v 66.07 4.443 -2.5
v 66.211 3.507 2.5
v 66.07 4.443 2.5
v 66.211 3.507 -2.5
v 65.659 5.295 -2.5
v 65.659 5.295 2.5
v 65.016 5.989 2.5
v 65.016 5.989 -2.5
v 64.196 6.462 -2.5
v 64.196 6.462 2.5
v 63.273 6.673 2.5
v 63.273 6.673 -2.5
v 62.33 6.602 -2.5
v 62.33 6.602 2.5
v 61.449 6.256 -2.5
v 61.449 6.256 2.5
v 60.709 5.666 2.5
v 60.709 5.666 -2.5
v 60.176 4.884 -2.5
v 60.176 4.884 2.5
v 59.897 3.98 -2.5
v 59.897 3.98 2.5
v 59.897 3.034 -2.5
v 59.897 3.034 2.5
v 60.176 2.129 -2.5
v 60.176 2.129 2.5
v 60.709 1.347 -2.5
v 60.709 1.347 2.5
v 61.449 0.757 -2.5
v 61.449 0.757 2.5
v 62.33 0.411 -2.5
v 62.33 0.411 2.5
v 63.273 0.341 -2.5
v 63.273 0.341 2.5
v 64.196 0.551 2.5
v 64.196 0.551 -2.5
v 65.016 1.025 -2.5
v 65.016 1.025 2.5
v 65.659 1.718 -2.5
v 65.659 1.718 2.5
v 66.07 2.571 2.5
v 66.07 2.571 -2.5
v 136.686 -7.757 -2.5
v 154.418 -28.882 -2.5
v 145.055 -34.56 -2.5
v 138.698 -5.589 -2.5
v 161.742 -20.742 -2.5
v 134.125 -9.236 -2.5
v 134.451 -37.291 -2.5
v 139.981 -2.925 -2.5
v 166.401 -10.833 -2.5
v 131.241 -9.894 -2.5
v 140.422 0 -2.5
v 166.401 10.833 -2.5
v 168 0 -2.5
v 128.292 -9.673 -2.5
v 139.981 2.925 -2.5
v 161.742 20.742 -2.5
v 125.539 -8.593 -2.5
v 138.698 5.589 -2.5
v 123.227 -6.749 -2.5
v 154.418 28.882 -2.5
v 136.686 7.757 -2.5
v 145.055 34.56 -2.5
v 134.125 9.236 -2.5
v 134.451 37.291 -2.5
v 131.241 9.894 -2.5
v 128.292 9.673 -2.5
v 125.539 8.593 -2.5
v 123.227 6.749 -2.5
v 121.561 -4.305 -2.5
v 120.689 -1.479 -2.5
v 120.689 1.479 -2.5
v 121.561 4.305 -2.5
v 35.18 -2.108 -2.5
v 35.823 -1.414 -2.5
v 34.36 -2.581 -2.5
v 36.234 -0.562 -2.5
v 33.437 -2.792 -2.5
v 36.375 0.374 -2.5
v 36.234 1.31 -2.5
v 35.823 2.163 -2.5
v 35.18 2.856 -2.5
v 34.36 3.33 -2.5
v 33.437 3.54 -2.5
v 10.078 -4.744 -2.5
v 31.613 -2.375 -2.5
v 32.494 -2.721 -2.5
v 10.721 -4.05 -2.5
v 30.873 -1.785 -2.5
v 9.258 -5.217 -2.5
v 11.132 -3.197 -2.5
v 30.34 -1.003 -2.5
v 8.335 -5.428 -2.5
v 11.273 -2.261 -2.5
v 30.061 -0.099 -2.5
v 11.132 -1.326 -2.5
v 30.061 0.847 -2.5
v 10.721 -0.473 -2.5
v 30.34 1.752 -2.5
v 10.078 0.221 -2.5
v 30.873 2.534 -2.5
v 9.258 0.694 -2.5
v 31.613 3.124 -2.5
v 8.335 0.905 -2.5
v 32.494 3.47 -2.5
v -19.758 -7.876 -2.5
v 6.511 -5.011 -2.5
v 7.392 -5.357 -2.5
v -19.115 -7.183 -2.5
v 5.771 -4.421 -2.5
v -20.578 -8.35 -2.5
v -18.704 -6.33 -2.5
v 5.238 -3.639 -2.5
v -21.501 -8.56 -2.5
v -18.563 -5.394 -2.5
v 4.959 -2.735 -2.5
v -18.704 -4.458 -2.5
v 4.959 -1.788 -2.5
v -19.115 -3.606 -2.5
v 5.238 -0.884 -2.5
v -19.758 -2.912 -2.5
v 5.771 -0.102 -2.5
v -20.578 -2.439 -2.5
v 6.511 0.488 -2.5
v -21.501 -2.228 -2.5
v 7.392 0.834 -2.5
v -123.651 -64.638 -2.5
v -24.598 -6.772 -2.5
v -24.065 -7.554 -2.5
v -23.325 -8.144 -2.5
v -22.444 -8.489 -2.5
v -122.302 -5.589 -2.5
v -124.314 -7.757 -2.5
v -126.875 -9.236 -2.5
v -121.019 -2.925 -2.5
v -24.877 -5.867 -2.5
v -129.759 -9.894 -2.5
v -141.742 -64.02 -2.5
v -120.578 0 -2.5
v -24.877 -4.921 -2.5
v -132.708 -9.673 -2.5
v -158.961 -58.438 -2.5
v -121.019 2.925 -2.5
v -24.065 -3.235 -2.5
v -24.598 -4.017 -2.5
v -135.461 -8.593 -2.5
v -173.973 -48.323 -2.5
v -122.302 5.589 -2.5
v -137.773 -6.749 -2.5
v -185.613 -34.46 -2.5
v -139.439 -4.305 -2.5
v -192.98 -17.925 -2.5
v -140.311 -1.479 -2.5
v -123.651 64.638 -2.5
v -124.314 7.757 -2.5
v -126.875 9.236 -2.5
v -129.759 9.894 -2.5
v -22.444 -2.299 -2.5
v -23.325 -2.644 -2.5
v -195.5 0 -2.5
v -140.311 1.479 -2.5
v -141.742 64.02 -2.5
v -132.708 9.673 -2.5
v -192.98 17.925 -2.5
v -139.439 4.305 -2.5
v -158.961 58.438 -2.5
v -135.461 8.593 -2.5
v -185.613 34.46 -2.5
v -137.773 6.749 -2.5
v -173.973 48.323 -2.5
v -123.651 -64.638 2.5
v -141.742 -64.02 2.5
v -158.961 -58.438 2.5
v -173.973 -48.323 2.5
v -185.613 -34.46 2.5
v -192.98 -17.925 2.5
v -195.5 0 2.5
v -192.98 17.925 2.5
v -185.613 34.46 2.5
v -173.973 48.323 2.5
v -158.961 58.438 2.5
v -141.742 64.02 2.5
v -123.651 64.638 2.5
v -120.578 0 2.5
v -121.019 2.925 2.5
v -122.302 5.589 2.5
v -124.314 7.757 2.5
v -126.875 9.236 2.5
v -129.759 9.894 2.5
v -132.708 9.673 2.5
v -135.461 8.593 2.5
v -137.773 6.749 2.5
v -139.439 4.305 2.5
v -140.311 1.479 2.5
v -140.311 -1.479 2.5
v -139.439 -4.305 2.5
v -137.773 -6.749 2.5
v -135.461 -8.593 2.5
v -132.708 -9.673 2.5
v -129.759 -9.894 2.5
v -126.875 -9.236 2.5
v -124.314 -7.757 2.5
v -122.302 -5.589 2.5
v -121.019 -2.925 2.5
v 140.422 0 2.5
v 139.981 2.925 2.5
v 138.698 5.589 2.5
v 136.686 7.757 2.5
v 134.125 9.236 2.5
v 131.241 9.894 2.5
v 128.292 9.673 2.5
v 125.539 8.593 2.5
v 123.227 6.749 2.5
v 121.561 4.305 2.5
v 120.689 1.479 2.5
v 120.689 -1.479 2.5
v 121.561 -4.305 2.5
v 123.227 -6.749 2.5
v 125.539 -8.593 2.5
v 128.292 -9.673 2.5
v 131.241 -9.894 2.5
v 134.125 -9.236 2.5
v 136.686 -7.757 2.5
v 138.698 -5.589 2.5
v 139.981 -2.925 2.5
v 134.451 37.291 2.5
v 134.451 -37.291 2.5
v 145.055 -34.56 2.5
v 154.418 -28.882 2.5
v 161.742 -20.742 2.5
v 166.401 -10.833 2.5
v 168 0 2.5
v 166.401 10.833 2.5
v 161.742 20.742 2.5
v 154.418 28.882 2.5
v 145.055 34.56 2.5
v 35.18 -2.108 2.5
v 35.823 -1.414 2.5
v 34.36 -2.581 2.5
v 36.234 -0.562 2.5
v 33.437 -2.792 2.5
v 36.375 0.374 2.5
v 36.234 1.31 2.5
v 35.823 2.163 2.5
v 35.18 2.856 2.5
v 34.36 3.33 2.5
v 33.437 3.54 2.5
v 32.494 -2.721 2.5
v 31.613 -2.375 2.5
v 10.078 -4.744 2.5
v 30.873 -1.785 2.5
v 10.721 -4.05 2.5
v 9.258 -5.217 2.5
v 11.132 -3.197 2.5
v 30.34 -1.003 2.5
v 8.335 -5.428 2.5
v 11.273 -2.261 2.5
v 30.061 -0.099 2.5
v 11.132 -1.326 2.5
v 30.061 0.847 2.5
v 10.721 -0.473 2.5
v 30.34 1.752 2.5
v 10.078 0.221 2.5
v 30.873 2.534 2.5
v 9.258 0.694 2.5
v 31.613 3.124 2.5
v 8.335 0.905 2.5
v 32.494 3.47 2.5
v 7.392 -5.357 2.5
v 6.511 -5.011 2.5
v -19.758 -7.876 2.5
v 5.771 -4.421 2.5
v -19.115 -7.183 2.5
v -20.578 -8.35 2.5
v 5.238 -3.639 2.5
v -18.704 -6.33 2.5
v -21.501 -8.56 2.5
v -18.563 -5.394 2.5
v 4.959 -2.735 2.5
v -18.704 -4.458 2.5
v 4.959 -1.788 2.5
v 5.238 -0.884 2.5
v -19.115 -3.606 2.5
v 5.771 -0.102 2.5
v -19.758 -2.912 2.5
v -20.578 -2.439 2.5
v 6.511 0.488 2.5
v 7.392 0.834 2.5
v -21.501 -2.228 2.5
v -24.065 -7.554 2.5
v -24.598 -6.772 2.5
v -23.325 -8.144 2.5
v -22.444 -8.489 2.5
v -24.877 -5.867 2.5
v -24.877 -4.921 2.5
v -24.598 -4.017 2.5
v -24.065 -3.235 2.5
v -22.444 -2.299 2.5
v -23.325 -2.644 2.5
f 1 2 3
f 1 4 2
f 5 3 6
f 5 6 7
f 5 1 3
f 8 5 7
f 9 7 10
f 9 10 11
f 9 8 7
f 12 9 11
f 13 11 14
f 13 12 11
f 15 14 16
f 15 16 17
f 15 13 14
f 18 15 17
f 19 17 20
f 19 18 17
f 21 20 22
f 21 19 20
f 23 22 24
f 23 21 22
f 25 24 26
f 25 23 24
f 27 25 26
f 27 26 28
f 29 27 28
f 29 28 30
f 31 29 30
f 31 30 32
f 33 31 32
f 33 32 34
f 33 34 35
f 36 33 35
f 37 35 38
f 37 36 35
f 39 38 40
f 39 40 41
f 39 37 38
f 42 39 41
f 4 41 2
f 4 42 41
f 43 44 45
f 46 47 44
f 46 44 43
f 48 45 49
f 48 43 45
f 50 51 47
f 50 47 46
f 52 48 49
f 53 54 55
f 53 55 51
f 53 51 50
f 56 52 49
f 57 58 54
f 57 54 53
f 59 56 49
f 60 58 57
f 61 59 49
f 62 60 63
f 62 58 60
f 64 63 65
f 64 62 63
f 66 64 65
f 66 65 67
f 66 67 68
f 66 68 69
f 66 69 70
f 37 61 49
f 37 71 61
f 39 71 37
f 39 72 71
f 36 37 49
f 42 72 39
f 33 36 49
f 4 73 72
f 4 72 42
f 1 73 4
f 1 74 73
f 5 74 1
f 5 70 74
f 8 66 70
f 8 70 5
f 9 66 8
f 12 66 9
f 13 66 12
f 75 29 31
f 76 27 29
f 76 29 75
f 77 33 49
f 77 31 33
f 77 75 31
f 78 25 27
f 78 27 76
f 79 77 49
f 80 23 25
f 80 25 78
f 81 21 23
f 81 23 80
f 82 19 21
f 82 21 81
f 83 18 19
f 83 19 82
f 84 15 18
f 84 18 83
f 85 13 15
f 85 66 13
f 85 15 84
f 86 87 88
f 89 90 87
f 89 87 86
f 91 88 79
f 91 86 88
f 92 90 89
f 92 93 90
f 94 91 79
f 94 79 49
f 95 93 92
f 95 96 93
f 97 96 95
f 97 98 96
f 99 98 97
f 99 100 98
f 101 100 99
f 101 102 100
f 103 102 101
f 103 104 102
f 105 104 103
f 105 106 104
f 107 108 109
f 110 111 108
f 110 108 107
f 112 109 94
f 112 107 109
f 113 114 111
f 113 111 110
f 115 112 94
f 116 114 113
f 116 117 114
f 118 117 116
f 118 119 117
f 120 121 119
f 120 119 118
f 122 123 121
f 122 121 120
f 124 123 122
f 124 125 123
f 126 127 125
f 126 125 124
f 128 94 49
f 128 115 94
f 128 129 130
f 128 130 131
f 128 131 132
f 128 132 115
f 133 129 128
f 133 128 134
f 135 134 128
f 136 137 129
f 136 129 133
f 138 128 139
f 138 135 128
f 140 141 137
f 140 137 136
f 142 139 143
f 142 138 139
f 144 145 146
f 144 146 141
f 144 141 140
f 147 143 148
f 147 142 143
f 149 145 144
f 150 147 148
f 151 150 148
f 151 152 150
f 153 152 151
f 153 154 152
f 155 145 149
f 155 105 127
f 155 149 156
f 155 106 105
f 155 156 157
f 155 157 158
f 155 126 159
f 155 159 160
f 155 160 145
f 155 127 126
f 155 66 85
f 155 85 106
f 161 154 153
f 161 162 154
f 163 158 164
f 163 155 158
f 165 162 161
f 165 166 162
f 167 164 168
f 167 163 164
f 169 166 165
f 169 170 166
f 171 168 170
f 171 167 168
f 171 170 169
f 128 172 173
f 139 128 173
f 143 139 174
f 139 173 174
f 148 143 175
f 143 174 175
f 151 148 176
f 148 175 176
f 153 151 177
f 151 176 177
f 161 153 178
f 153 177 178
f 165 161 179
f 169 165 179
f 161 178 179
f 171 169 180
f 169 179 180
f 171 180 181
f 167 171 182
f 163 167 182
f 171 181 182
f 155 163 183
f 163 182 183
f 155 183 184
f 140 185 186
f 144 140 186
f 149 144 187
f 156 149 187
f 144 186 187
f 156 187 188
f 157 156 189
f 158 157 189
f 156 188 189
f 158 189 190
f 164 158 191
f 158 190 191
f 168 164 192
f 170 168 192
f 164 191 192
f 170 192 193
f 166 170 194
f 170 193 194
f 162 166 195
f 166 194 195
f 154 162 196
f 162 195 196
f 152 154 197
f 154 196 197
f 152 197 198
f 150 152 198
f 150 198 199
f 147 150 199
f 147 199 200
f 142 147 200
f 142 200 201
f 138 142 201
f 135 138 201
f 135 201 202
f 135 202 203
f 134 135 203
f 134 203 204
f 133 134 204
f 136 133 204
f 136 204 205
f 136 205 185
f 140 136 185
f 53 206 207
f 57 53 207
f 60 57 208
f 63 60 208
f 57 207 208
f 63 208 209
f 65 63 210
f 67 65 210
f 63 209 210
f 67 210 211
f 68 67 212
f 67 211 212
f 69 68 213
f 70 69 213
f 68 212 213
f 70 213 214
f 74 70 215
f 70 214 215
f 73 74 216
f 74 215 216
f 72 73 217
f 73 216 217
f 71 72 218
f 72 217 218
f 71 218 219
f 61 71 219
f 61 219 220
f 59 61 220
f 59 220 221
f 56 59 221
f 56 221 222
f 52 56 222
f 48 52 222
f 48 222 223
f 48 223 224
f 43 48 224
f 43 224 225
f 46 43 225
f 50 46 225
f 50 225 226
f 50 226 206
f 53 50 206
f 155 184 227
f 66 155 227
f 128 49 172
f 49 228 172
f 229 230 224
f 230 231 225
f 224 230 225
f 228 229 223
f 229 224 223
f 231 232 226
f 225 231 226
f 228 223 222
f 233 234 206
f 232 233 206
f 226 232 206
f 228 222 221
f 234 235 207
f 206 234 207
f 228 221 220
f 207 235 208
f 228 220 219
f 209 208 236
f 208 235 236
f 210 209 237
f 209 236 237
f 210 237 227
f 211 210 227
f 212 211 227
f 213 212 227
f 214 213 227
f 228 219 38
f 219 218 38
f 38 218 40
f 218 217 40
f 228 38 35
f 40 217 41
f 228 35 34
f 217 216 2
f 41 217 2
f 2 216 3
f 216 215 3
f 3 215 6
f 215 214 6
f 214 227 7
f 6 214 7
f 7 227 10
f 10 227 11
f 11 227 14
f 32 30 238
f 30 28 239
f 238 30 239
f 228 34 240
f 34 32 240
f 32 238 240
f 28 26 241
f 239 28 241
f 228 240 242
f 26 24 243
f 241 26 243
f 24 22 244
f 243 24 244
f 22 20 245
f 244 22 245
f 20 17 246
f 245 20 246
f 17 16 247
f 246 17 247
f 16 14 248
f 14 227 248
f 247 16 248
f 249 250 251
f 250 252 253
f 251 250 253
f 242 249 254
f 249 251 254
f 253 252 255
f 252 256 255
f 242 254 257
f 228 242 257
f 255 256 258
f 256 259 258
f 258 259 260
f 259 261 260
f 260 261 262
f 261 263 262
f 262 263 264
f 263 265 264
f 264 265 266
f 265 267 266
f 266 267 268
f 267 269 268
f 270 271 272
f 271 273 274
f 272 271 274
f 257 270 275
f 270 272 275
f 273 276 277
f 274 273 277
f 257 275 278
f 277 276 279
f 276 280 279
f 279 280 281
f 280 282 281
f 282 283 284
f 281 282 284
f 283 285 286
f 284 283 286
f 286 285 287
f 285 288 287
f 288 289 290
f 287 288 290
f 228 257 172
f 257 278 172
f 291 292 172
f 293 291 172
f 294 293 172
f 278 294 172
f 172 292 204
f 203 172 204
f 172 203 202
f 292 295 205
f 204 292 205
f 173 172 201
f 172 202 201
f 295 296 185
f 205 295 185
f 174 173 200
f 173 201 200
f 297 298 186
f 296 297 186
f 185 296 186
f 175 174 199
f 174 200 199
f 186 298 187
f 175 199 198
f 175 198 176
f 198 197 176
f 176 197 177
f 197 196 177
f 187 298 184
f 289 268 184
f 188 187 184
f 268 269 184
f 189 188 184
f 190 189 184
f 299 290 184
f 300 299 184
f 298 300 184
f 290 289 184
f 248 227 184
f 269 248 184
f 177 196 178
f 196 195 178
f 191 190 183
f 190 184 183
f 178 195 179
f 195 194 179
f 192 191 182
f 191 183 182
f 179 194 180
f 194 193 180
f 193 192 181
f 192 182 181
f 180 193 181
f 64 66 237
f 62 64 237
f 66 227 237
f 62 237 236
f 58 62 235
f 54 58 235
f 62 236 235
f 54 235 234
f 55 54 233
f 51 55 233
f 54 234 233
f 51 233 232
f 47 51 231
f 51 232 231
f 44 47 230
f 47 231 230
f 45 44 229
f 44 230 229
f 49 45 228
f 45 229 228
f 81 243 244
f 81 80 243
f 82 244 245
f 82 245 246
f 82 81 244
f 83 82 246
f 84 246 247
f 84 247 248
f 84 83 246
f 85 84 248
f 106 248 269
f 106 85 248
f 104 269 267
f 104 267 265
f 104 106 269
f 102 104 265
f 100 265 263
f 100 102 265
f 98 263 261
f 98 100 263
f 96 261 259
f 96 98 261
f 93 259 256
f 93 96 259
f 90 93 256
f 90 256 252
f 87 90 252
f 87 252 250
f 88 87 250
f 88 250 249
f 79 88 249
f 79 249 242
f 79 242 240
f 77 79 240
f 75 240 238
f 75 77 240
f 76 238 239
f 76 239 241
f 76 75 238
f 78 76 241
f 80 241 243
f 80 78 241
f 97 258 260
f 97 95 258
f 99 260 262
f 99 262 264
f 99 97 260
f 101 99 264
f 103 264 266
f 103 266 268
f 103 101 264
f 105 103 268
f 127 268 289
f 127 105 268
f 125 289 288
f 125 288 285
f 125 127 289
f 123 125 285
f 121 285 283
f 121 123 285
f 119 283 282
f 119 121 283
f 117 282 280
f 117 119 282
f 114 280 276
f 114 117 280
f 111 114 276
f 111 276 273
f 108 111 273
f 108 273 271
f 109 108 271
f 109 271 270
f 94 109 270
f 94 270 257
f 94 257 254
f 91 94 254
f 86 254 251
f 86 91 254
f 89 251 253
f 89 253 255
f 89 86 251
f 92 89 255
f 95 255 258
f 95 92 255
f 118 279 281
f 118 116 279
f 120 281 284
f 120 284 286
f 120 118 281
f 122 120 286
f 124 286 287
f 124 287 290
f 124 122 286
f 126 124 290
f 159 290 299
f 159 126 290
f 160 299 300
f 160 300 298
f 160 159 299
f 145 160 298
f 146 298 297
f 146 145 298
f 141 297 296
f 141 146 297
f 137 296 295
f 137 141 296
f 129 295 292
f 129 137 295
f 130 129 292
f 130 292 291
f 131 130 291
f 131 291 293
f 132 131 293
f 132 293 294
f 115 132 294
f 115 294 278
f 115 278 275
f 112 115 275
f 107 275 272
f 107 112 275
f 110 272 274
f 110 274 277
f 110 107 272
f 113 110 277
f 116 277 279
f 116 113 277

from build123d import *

# Parameters (mm, degrees)
CROQUIS1_R              = 3.175
SALIENTE_EXTRUIR1_DEPTH = 2.5
CROQUIS2_R              = 9.921875
CORTAR_EXTRUIR1_DEPTH   = 10


with BuildPart() as part:
    # Croquis1 → Saliente-Extruir1 (new, symmetric)
    with BuildSketch(Plane.XY):
        with BuildLine():
            Line((-123.651340996, 64.638192037), (134.451149425, 37.291264637))
            ThreePointArc((134.451149425, 37.291264637), (168, 0), (134.451149425, -37.291264637))
            Line((134.451149425, -37.291264637), (-123.651340996, -64.638192037))
            ThreePointArc((-123.651340996, -64.638192037), (-195.5, 0), (-123.651340996, 64.638192037))
        make_face()
        with Locations((63.036149834, 3.50684658)):
            Circle(CROQUIS1_R, mode=Mode.SUBTRACT)
        with Locations((33.200158154, 0.374179913)):
            Circle(CROQUIS1_R, mode=Mode.SUBTRACT)
        with Locations((-21.73784786, -5.394103642)):
            Circle(CROQUIS1_R, mode=Mode.SUBTRACT)
        with Locations((8.09814382, -2.261436976)):
            Circle(CROQUIS1_R, mode=Mode.SUBTRACT)
    extrude(amount=SALIENTE_EXTRUIR1_DEPTH, both=True)

    # Croquis2 → Cortar-Extruir1 (cut)
    with BuildSketch(Plane.XY.offset(2.5)):
        with Locations((-130.5, 0)):
            Circle(CROQUIS2_R)
        with Locations((130.5, 0)):
            Circle(CROQUIS2_R)
    extrude(amount=-CORTAR_EXTRUIR1_DEPTH, mode=Mode.SUBTRACT)


solid = part.part
